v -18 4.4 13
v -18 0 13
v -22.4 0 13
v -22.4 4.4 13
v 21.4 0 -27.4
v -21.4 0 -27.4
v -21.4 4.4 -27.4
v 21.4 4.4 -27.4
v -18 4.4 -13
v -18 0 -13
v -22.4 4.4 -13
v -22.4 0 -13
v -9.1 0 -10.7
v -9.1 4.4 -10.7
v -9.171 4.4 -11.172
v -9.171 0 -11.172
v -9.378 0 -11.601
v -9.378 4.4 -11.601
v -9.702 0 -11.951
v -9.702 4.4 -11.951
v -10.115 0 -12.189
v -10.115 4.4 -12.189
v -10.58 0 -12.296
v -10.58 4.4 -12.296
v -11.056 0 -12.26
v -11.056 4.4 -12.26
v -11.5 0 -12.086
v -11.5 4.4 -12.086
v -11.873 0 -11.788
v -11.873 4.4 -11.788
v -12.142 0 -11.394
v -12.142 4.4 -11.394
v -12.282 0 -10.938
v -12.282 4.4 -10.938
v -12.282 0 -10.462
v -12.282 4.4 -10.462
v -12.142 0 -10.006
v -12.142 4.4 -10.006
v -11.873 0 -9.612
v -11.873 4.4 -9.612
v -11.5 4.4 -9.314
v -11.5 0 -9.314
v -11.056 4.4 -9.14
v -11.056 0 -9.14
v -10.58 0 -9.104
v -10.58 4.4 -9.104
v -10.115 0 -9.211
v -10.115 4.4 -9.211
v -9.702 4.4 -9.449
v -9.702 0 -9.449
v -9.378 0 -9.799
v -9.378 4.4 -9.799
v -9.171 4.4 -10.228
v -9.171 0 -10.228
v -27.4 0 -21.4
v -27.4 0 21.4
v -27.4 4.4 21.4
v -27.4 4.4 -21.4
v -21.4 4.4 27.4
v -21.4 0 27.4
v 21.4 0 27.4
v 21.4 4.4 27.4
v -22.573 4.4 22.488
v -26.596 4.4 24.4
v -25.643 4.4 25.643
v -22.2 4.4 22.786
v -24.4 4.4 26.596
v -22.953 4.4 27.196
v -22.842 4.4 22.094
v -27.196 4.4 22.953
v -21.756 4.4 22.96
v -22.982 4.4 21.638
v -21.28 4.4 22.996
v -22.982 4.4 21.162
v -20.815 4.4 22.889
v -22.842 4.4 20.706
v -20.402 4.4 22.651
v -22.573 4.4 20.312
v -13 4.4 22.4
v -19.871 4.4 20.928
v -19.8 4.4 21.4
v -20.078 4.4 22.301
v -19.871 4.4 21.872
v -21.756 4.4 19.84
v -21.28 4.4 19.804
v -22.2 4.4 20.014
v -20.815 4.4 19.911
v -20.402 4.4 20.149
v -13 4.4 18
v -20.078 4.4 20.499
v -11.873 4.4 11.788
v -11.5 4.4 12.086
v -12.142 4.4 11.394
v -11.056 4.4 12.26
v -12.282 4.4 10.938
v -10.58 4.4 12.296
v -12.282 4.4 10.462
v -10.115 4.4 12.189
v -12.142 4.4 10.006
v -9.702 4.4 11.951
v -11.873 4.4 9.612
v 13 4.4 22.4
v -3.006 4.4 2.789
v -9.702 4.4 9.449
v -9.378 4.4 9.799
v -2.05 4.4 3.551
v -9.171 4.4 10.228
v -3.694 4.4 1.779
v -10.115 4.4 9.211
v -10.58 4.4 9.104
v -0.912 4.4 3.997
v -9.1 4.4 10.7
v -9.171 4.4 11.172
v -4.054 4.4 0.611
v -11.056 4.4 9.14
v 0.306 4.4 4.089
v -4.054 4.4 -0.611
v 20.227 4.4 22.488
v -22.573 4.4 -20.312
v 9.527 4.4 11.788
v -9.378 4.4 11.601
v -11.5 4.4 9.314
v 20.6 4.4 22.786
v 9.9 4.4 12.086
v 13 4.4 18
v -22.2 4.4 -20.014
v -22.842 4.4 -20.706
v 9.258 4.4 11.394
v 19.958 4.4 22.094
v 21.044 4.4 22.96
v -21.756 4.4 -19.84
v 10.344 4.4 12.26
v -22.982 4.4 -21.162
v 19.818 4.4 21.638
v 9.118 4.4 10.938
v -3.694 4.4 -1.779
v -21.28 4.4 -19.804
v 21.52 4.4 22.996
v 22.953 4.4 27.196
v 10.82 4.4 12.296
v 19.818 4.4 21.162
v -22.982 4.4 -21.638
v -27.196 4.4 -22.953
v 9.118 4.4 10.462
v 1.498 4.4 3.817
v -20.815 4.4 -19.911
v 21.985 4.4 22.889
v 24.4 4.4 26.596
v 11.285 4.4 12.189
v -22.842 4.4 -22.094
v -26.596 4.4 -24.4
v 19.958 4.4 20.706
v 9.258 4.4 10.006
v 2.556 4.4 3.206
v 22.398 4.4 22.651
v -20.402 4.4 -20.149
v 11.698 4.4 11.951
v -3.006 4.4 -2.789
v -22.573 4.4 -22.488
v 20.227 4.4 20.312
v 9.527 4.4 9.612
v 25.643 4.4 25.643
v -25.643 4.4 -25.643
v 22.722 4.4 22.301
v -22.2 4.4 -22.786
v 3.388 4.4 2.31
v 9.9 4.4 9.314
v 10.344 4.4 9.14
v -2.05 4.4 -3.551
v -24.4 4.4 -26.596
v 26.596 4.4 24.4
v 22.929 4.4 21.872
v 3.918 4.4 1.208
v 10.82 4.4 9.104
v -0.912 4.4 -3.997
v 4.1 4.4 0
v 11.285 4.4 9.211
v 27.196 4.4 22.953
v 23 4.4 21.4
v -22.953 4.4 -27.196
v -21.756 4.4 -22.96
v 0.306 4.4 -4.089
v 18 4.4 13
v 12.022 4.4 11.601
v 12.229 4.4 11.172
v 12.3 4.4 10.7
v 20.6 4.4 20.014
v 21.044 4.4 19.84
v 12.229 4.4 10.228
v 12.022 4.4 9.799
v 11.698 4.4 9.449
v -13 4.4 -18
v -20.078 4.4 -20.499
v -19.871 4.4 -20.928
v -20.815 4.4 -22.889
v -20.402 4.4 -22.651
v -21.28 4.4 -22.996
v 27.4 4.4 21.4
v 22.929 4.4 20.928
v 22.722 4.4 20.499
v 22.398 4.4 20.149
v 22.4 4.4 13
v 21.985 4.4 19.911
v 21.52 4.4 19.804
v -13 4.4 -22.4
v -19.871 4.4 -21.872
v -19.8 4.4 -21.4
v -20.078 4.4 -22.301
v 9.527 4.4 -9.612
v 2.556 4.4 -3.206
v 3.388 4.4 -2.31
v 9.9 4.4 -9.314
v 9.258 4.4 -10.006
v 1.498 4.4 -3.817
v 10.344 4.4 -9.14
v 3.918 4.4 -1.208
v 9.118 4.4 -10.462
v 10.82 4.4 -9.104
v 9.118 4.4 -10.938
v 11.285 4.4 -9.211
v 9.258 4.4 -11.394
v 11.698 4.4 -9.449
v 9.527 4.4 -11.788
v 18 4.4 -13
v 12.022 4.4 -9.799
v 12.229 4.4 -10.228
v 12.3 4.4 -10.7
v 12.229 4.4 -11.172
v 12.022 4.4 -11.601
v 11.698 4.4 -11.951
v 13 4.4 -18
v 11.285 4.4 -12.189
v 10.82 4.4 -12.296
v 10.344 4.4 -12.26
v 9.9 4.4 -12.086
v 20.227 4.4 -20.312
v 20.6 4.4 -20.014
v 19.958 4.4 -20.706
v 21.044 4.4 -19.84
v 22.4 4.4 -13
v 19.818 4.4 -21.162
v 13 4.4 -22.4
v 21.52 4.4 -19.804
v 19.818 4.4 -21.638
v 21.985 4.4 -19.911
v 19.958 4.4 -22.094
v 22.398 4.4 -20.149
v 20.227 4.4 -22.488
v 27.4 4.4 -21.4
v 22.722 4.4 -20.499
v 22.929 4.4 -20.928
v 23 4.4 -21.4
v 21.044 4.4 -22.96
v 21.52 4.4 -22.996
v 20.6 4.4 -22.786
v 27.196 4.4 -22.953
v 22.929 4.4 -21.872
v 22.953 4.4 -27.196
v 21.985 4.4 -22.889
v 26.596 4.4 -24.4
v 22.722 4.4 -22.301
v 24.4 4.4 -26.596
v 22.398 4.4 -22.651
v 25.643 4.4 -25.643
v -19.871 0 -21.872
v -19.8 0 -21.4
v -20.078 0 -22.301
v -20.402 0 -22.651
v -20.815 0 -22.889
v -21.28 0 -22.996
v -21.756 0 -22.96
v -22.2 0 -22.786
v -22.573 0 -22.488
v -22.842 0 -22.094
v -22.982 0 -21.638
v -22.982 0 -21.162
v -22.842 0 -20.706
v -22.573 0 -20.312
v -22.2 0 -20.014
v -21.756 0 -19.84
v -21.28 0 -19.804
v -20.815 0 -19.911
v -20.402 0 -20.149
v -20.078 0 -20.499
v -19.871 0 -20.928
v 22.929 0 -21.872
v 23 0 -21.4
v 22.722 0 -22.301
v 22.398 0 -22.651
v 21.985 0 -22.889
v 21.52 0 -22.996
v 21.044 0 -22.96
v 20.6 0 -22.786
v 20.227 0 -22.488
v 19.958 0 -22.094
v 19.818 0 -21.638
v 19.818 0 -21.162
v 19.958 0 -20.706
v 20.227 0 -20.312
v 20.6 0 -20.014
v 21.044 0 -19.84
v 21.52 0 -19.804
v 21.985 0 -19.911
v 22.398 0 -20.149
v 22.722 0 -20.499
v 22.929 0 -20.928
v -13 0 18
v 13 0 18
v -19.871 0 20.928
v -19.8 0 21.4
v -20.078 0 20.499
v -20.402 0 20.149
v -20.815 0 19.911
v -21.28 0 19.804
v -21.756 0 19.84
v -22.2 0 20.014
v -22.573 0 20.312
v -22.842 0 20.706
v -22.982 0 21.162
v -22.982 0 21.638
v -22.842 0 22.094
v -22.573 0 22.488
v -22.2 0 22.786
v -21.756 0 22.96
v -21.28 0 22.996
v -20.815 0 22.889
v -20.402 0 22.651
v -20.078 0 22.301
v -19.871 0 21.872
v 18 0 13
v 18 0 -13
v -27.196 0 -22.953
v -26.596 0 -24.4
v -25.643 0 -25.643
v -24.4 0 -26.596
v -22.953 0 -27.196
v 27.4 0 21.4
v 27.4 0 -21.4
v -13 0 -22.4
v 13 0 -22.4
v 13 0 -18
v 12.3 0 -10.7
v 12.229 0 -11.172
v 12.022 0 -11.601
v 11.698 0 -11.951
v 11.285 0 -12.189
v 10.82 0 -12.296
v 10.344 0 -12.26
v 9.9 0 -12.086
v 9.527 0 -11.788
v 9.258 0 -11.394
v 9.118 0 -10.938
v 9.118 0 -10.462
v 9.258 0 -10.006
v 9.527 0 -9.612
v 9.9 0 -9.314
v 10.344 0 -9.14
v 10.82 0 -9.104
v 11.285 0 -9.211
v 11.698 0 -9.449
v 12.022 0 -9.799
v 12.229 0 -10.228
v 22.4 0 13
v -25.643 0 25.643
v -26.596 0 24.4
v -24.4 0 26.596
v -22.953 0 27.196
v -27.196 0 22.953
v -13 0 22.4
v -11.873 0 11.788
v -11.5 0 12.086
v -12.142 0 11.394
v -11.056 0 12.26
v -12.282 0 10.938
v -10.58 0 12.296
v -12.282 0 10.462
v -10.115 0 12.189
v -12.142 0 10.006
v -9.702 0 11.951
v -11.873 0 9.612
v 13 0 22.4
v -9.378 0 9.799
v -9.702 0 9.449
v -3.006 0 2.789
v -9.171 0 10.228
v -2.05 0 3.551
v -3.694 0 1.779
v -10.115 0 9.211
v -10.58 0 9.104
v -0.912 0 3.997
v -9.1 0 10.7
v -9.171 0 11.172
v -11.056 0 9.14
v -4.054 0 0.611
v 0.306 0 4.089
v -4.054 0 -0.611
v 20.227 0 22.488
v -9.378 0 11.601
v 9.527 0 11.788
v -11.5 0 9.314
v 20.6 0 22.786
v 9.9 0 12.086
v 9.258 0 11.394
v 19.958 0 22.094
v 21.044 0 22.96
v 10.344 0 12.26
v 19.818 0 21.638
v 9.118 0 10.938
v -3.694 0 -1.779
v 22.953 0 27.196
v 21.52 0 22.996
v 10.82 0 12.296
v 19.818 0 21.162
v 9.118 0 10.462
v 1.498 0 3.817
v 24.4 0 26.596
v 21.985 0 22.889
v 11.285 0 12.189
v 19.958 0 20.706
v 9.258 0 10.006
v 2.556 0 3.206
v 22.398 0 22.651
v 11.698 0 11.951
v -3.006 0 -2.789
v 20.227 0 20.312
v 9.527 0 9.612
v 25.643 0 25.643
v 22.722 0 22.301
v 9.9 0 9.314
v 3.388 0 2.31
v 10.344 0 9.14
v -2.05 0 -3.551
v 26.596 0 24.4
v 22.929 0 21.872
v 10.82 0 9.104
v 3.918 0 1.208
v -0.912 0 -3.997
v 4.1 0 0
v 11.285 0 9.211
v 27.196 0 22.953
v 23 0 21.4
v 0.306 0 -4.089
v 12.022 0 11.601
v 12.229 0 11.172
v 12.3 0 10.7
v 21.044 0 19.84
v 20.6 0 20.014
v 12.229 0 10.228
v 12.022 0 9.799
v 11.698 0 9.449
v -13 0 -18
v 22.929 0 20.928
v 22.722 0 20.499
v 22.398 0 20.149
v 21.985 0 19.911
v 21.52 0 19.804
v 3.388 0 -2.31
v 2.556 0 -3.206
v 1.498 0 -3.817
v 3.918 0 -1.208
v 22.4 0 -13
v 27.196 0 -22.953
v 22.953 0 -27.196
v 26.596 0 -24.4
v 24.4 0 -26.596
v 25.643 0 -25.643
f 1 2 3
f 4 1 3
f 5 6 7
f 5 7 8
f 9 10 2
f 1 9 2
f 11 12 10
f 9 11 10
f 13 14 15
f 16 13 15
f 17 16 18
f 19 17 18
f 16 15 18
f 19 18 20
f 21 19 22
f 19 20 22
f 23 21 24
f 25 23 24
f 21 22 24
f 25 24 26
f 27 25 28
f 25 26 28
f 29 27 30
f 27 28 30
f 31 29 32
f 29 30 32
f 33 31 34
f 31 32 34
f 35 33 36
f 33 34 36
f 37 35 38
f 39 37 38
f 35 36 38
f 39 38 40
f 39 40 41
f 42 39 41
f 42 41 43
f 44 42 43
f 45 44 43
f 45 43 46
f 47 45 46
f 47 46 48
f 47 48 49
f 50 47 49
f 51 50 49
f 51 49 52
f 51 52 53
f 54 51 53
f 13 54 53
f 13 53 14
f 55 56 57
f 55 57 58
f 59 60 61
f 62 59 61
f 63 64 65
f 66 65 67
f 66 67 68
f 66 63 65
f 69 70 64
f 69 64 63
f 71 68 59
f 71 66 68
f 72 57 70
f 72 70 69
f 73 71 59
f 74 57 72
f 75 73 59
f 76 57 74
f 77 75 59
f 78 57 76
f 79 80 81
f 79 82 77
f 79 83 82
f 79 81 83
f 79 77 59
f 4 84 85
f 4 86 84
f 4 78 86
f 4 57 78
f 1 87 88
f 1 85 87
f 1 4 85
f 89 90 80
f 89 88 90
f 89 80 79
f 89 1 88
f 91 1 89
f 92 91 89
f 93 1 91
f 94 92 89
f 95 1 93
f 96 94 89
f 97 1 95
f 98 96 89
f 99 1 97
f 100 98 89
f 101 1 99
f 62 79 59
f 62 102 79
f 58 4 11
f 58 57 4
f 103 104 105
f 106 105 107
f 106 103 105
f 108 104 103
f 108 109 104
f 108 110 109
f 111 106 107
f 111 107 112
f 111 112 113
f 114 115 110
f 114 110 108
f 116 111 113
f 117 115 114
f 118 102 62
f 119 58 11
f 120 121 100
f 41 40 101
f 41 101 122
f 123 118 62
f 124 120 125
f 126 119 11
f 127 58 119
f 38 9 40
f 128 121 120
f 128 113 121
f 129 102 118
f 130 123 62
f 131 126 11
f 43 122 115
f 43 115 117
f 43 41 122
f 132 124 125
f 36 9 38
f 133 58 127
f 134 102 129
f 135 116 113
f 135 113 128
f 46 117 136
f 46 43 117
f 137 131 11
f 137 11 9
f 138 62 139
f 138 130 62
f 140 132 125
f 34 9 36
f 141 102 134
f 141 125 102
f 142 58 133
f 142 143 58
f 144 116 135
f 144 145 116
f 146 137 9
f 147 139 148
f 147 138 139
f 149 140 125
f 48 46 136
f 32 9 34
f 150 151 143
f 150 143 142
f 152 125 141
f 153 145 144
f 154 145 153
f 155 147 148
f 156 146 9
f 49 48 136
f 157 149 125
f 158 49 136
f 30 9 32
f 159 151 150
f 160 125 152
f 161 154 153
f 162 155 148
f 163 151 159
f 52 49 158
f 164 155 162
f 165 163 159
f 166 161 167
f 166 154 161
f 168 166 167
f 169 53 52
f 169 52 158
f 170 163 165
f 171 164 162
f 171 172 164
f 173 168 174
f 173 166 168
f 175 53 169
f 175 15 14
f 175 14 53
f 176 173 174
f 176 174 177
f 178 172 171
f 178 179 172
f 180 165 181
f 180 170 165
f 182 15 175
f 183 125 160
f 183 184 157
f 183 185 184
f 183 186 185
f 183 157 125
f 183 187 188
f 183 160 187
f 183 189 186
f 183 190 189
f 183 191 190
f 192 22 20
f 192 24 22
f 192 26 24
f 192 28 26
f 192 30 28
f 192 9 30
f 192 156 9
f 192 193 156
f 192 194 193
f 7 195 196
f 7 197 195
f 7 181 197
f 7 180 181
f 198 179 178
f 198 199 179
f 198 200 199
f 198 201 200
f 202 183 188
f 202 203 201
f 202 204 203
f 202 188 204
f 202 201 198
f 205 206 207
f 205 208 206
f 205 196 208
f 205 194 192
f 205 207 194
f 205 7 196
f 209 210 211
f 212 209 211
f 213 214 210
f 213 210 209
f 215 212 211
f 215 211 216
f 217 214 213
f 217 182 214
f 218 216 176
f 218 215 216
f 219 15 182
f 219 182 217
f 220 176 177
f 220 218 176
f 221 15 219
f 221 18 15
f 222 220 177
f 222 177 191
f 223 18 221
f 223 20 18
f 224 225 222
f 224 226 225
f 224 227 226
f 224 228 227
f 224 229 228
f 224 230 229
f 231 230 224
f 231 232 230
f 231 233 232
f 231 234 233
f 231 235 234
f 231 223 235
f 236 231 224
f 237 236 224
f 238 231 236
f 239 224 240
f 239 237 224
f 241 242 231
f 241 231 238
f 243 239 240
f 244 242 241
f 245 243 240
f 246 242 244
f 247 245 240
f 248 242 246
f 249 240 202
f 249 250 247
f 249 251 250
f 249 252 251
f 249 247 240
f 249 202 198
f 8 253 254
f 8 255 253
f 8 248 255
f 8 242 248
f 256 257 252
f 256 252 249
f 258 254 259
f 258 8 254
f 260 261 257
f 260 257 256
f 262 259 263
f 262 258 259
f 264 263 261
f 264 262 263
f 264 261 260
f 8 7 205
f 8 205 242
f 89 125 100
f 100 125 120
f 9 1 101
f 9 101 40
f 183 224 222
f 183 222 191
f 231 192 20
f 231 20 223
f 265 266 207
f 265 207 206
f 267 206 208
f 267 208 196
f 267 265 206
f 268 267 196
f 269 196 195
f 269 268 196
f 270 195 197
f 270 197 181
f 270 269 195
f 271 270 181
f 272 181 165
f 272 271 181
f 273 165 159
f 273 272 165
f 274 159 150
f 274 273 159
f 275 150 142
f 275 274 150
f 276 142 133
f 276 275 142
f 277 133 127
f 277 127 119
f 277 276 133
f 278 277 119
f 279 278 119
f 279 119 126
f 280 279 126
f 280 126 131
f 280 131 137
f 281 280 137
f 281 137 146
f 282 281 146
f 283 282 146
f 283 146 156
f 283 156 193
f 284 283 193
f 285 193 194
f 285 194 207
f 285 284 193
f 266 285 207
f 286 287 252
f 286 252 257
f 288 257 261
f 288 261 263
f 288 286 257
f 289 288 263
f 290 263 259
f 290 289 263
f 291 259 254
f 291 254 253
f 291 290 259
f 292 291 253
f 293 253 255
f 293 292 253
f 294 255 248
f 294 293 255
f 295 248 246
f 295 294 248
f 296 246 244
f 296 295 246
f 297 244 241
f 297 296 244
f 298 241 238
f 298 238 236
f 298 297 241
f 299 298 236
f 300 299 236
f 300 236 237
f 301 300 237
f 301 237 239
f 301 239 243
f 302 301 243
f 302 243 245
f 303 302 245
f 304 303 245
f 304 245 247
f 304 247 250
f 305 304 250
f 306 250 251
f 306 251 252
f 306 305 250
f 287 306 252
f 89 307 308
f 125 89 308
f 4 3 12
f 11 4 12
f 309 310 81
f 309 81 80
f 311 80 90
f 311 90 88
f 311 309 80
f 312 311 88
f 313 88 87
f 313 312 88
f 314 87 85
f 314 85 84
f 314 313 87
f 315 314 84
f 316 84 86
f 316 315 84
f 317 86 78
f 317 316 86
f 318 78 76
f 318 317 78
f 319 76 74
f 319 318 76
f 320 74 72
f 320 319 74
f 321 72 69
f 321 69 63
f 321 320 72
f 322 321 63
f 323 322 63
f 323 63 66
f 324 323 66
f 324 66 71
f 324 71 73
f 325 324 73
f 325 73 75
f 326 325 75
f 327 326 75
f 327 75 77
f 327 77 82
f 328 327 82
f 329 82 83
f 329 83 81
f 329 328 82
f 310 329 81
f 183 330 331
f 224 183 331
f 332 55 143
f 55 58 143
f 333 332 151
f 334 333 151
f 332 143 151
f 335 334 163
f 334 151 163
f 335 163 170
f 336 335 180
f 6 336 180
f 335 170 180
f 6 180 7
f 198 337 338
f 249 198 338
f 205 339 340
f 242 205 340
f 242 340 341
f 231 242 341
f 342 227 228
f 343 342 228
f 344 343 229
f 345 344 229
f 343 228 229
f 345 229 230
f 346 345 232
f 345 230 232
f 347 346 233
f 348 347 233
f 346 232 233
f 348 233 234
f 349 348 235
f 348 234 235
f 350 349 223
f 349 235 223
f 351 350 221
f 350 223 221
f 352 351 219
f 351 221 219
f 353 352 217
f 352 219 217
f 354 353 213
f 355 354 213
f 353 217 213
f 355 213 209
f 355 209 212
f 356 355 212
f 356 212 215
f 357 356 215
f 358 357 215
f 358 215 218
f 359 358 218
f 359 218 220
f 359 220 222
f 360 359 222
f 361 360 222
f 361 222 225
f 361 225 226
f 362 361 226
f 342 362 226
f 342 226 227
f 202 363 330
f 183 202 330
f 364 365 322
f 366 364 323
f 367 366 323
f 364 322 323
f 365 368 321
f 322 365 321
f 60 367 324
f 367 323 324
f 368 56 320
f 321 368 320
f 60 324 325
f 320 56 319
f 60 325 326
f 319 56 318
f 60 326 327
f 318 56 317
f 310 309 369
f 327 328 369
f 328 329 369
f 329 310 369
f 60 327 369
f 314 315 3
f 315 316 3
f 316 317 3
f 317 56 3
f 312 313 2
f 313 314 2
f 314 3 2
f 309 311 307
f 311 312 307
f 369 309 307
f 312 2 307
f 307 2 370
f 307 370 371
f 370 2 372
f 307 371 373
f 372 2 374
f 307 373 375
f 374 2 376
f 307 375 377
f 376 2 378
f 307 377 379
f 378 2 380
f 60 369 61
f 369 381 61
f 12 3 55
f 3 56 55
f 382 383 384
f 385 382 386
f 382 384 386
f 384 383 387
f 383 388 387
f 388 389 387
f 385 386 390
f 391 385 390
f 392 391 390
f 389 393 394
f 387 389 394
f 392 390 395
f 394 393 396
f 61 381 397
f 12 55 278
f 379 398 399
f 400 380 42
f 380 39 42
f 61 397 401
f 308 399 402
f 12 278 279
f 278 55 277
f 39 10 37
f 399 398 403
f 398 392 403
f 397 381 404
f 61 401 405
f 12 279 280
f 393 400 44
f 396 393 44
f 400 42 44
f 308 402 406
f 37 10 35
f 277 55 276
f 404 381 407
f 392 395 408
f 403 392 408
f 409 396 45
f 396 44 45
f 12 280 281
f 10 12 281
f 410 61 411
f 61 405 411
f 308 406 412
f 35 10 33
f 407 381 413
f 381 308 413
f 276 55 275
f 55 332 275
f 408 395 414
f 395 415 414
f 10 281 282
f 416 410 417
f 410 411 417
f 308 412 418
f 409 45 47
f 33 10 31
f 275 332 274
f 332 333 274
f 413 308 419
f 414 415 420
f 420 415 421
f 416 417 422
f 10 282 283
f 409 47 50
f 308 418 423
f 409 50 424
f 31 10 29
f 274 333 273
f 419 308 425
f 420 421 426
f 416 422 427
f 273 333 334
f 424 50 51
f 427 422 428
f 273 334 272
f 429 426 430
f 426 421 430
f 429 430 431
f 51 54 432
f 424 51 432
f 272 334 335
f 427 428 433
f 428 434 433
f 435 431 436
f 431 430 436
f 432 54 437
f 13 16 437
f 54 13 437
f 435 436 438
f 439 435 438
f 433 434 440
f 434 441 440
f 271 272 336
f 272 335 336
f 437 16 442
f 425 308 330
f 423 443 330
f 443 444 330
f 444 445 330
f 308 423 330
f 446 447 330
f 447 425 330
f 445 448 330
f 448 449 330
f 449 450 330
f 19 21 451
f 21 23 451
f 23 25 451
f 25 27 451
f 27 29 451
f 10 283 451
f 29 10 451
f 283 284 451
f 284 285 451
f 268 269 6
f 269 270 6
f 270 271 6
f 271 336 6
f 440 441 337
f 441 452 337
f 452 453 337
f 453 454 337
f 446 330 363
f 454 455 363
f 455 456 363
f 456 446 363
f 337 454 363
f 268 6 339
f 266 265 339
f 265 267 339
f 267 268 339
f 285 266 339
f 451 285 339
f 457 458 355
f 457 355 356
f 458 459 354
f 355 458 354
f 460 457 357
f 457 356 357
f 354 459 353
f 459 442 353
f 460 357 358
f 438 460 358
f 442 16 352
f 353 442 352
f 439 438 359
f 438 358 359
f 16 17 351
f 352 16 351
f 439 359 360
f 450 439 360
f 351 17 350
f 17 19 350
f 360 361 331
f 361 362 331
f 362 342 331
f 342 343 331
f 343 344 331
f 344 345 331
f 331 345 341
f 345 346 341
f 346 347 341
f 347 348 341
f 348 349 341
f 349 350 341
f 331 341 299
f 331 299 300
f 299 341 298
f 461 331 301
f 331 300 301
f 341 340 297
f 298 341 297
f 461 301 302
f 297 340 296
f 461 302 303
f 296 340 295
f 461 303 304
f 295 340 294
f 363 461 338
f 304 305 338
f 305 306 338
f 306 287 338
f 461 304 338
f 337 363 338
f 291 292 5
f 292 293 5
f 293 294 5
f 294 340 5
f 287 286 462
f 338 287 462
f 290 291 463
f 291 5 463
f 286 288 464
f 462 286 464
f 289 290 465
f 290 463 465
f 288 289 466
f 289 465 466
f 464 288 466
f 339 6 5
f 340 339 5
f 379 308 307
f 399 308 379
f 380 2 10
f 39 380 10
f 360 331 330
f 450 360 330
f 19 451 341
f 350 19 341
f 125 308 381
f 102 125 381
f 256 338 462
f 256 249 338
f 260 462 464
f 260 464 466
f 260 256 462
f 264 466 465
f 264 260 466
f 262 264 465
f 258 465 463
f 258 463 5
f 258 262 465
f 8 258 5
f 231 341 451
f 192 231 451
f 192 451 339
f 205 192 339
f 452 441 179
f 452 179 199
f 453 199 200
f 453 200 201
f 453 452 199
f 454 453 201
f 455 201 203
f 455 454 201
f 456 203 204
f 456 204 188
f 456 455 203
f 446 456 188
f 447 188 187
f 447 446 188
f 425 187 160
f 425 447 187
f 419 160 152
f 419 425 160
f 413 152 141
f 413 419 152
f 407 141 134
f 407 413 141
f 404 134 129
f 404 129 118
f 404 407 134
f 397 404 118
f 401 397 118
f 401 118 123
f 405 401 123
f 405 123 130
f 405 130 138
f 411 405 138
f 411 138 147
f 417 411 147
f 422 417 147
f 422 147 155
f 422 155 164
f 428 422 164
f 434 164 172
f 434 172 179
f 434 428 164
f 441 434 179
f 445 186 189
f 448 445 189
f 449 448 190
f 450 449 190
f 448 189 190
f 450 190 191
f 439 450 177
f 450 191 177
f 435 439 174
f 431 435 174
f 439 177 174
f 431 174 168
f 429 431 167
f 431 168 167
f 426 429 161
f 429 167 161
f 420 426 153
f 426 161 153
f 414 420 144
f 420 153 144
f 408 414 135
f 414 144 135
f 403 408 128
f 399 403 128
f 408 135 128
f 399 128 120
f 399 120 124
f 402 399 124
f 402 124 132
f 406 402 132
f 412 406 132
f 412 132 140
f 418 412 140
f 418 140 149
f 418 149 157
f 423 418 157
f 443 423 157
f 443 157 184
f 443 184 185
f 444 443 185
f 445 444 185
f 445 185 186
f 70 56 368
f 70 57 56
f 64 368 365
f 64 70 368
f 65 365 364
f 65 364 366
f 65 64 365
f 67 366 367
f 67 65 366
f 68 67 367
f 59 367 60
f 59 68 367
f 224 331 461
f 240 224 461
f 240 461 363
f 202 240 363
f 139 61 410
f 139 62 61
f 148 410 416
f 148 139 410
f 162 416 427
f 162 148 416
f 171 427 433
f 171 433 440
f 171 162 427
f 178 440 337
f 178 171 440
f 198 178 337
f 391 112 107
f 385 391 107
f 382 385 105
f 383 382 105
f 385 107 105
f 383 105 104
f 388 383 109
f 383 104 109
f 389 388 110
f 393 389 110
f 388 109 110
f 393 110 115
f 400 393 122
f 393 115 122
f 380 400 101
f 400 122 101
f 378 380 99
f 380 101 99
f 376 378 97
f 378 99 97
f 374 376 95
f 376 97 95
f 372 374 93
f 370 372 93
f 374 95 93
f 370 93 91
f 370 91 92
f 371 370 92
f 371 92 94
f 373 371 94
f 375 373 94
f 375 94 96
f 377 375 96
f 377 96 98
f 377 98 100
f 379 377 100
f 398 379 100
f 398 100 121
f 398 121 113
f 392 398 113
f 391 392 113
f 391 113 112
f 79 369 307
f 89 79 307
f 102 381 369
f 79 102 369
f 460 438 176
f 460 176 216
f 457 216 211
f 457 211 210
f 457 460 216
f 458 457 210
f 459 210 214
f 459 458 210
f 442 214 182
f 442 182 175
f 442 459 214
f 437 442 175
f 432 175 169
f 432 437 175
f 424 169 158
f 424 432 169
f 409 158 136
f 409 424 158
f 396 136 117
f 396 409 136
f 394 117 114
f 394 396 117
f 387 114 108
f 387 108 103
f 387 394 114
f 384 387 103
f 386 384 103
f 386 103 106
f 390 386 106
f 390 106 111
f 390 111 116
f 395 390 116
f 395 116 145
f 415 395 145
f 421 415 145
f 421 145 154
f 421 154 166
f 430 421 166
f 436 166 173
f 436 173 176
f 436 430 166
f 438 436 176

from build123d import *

# Parameters (mm, degrees)
SKETCH_1_W          = 54.8
SKETCH_1_H          = 54.8
SKETCH_1_R          = 4.1
SKETCH_1_R_2        = 1.6
EXTRUDE_1_DEPTH     = 4.4
FILLET_1_R          = 6
SKETCH_2_R          = 1.6
CUT_EXTRUDE_1_DEPTH = 10


with BuildPart() as part:
    # 草图1 → 凸台-拉伸1 (new body)
    with BuildSketch(Plane(origin=(0, 0, 0), x_dir=(1, 0, 0), z_dir=(0, 1, 0))):
        Rectangle(SKETCH_1_W, SKETCH_1_H)
        Circle(SKETCH_1_R, mode=Mode.SUBTRACT)
        with Locations((21.4, 21.4)):
            Circle(SKETCH_1_R_2, mode=Mode.SUBTRACT)
        with Locations((21.4, -21.4)):
            Circle(SKETCH_1_R_2, mode=Mode.SUBTRACT)
        with Locations((-21.4, -21.4)):
            Circle(SKETCH_1_R_2, mode=Mode.SUBTRACT)
        with Locations((-21.4, 21.4)):
            Circle(SKETCH_1_R_2, mode=Mode.SUBTRACT)
        Polygon((18, -5), (18, 5), (18, 13), (22.4, 13), (22.4, 5), (22.4, -5), (22.4, -13), (18, -13), align=None, mode=Mode.SUBTRACT)
        Polygon((-5, 18), (-13, 18), (-13, 22.4), (-5, 22.4), (5, 22.4), (13, 22.4), (13, 18), (5, 18), align=None, mode=Mode.SUBTRACT)
        Polygon((5, -18), (13, -18), (13, -22.4), (5, -22.4), (-5, -22.4), (-13, -22.4), (-13, -18), (-5, -18), align=None, mode=Mode.SUBTRACT)
        Polygon((-18, 5), (-18, -5), (-18, -13), (-22.4, -13), (-22.4, -5), (-22.4, 5), (-22.4, 13), (-18, 13), align=None, mode=Mode.SUBTRACT)
    extrude(amount=EXTRUDE_1_DEPTH)

    # 圆角1
    fillet_1_edges = [part.edges().sort_by_distance(p)[0] for p in [
        (27.4, 2.2, 27.4),
        (-27.4, 2.2, 27.4),
        (-27.4, 2.2, -27.4),
        (27.4, 2.2, -27.4),
    ]]
    fillet(fillet_1_edges, radius=FILLET_1_R)

    # 草图2 → 切除-拉伸1 (cut)
    with BuildSketch(Plane(origin=(0, 4.4, 0), x_dir=(1, 0, 0), z_dir=(0, 1, 0))):
        with Locations((10.7, 10.7)):
            Circle(SKETCH_2_R)
        with Locations((10.7, -10.7)):
            Circle(SKETCH_2_R)
        with Locations((-10.7, -10.7)):
            Circle(SKETCH_2_R)
        with Locations((-10.7, 10.7)):
            Circle(SKETCH_2_R)
    extrude(amount=-CUT_EXTRUDE_1_DEPTH, mode=Mode.SUBTRACT)


solid = part.part
